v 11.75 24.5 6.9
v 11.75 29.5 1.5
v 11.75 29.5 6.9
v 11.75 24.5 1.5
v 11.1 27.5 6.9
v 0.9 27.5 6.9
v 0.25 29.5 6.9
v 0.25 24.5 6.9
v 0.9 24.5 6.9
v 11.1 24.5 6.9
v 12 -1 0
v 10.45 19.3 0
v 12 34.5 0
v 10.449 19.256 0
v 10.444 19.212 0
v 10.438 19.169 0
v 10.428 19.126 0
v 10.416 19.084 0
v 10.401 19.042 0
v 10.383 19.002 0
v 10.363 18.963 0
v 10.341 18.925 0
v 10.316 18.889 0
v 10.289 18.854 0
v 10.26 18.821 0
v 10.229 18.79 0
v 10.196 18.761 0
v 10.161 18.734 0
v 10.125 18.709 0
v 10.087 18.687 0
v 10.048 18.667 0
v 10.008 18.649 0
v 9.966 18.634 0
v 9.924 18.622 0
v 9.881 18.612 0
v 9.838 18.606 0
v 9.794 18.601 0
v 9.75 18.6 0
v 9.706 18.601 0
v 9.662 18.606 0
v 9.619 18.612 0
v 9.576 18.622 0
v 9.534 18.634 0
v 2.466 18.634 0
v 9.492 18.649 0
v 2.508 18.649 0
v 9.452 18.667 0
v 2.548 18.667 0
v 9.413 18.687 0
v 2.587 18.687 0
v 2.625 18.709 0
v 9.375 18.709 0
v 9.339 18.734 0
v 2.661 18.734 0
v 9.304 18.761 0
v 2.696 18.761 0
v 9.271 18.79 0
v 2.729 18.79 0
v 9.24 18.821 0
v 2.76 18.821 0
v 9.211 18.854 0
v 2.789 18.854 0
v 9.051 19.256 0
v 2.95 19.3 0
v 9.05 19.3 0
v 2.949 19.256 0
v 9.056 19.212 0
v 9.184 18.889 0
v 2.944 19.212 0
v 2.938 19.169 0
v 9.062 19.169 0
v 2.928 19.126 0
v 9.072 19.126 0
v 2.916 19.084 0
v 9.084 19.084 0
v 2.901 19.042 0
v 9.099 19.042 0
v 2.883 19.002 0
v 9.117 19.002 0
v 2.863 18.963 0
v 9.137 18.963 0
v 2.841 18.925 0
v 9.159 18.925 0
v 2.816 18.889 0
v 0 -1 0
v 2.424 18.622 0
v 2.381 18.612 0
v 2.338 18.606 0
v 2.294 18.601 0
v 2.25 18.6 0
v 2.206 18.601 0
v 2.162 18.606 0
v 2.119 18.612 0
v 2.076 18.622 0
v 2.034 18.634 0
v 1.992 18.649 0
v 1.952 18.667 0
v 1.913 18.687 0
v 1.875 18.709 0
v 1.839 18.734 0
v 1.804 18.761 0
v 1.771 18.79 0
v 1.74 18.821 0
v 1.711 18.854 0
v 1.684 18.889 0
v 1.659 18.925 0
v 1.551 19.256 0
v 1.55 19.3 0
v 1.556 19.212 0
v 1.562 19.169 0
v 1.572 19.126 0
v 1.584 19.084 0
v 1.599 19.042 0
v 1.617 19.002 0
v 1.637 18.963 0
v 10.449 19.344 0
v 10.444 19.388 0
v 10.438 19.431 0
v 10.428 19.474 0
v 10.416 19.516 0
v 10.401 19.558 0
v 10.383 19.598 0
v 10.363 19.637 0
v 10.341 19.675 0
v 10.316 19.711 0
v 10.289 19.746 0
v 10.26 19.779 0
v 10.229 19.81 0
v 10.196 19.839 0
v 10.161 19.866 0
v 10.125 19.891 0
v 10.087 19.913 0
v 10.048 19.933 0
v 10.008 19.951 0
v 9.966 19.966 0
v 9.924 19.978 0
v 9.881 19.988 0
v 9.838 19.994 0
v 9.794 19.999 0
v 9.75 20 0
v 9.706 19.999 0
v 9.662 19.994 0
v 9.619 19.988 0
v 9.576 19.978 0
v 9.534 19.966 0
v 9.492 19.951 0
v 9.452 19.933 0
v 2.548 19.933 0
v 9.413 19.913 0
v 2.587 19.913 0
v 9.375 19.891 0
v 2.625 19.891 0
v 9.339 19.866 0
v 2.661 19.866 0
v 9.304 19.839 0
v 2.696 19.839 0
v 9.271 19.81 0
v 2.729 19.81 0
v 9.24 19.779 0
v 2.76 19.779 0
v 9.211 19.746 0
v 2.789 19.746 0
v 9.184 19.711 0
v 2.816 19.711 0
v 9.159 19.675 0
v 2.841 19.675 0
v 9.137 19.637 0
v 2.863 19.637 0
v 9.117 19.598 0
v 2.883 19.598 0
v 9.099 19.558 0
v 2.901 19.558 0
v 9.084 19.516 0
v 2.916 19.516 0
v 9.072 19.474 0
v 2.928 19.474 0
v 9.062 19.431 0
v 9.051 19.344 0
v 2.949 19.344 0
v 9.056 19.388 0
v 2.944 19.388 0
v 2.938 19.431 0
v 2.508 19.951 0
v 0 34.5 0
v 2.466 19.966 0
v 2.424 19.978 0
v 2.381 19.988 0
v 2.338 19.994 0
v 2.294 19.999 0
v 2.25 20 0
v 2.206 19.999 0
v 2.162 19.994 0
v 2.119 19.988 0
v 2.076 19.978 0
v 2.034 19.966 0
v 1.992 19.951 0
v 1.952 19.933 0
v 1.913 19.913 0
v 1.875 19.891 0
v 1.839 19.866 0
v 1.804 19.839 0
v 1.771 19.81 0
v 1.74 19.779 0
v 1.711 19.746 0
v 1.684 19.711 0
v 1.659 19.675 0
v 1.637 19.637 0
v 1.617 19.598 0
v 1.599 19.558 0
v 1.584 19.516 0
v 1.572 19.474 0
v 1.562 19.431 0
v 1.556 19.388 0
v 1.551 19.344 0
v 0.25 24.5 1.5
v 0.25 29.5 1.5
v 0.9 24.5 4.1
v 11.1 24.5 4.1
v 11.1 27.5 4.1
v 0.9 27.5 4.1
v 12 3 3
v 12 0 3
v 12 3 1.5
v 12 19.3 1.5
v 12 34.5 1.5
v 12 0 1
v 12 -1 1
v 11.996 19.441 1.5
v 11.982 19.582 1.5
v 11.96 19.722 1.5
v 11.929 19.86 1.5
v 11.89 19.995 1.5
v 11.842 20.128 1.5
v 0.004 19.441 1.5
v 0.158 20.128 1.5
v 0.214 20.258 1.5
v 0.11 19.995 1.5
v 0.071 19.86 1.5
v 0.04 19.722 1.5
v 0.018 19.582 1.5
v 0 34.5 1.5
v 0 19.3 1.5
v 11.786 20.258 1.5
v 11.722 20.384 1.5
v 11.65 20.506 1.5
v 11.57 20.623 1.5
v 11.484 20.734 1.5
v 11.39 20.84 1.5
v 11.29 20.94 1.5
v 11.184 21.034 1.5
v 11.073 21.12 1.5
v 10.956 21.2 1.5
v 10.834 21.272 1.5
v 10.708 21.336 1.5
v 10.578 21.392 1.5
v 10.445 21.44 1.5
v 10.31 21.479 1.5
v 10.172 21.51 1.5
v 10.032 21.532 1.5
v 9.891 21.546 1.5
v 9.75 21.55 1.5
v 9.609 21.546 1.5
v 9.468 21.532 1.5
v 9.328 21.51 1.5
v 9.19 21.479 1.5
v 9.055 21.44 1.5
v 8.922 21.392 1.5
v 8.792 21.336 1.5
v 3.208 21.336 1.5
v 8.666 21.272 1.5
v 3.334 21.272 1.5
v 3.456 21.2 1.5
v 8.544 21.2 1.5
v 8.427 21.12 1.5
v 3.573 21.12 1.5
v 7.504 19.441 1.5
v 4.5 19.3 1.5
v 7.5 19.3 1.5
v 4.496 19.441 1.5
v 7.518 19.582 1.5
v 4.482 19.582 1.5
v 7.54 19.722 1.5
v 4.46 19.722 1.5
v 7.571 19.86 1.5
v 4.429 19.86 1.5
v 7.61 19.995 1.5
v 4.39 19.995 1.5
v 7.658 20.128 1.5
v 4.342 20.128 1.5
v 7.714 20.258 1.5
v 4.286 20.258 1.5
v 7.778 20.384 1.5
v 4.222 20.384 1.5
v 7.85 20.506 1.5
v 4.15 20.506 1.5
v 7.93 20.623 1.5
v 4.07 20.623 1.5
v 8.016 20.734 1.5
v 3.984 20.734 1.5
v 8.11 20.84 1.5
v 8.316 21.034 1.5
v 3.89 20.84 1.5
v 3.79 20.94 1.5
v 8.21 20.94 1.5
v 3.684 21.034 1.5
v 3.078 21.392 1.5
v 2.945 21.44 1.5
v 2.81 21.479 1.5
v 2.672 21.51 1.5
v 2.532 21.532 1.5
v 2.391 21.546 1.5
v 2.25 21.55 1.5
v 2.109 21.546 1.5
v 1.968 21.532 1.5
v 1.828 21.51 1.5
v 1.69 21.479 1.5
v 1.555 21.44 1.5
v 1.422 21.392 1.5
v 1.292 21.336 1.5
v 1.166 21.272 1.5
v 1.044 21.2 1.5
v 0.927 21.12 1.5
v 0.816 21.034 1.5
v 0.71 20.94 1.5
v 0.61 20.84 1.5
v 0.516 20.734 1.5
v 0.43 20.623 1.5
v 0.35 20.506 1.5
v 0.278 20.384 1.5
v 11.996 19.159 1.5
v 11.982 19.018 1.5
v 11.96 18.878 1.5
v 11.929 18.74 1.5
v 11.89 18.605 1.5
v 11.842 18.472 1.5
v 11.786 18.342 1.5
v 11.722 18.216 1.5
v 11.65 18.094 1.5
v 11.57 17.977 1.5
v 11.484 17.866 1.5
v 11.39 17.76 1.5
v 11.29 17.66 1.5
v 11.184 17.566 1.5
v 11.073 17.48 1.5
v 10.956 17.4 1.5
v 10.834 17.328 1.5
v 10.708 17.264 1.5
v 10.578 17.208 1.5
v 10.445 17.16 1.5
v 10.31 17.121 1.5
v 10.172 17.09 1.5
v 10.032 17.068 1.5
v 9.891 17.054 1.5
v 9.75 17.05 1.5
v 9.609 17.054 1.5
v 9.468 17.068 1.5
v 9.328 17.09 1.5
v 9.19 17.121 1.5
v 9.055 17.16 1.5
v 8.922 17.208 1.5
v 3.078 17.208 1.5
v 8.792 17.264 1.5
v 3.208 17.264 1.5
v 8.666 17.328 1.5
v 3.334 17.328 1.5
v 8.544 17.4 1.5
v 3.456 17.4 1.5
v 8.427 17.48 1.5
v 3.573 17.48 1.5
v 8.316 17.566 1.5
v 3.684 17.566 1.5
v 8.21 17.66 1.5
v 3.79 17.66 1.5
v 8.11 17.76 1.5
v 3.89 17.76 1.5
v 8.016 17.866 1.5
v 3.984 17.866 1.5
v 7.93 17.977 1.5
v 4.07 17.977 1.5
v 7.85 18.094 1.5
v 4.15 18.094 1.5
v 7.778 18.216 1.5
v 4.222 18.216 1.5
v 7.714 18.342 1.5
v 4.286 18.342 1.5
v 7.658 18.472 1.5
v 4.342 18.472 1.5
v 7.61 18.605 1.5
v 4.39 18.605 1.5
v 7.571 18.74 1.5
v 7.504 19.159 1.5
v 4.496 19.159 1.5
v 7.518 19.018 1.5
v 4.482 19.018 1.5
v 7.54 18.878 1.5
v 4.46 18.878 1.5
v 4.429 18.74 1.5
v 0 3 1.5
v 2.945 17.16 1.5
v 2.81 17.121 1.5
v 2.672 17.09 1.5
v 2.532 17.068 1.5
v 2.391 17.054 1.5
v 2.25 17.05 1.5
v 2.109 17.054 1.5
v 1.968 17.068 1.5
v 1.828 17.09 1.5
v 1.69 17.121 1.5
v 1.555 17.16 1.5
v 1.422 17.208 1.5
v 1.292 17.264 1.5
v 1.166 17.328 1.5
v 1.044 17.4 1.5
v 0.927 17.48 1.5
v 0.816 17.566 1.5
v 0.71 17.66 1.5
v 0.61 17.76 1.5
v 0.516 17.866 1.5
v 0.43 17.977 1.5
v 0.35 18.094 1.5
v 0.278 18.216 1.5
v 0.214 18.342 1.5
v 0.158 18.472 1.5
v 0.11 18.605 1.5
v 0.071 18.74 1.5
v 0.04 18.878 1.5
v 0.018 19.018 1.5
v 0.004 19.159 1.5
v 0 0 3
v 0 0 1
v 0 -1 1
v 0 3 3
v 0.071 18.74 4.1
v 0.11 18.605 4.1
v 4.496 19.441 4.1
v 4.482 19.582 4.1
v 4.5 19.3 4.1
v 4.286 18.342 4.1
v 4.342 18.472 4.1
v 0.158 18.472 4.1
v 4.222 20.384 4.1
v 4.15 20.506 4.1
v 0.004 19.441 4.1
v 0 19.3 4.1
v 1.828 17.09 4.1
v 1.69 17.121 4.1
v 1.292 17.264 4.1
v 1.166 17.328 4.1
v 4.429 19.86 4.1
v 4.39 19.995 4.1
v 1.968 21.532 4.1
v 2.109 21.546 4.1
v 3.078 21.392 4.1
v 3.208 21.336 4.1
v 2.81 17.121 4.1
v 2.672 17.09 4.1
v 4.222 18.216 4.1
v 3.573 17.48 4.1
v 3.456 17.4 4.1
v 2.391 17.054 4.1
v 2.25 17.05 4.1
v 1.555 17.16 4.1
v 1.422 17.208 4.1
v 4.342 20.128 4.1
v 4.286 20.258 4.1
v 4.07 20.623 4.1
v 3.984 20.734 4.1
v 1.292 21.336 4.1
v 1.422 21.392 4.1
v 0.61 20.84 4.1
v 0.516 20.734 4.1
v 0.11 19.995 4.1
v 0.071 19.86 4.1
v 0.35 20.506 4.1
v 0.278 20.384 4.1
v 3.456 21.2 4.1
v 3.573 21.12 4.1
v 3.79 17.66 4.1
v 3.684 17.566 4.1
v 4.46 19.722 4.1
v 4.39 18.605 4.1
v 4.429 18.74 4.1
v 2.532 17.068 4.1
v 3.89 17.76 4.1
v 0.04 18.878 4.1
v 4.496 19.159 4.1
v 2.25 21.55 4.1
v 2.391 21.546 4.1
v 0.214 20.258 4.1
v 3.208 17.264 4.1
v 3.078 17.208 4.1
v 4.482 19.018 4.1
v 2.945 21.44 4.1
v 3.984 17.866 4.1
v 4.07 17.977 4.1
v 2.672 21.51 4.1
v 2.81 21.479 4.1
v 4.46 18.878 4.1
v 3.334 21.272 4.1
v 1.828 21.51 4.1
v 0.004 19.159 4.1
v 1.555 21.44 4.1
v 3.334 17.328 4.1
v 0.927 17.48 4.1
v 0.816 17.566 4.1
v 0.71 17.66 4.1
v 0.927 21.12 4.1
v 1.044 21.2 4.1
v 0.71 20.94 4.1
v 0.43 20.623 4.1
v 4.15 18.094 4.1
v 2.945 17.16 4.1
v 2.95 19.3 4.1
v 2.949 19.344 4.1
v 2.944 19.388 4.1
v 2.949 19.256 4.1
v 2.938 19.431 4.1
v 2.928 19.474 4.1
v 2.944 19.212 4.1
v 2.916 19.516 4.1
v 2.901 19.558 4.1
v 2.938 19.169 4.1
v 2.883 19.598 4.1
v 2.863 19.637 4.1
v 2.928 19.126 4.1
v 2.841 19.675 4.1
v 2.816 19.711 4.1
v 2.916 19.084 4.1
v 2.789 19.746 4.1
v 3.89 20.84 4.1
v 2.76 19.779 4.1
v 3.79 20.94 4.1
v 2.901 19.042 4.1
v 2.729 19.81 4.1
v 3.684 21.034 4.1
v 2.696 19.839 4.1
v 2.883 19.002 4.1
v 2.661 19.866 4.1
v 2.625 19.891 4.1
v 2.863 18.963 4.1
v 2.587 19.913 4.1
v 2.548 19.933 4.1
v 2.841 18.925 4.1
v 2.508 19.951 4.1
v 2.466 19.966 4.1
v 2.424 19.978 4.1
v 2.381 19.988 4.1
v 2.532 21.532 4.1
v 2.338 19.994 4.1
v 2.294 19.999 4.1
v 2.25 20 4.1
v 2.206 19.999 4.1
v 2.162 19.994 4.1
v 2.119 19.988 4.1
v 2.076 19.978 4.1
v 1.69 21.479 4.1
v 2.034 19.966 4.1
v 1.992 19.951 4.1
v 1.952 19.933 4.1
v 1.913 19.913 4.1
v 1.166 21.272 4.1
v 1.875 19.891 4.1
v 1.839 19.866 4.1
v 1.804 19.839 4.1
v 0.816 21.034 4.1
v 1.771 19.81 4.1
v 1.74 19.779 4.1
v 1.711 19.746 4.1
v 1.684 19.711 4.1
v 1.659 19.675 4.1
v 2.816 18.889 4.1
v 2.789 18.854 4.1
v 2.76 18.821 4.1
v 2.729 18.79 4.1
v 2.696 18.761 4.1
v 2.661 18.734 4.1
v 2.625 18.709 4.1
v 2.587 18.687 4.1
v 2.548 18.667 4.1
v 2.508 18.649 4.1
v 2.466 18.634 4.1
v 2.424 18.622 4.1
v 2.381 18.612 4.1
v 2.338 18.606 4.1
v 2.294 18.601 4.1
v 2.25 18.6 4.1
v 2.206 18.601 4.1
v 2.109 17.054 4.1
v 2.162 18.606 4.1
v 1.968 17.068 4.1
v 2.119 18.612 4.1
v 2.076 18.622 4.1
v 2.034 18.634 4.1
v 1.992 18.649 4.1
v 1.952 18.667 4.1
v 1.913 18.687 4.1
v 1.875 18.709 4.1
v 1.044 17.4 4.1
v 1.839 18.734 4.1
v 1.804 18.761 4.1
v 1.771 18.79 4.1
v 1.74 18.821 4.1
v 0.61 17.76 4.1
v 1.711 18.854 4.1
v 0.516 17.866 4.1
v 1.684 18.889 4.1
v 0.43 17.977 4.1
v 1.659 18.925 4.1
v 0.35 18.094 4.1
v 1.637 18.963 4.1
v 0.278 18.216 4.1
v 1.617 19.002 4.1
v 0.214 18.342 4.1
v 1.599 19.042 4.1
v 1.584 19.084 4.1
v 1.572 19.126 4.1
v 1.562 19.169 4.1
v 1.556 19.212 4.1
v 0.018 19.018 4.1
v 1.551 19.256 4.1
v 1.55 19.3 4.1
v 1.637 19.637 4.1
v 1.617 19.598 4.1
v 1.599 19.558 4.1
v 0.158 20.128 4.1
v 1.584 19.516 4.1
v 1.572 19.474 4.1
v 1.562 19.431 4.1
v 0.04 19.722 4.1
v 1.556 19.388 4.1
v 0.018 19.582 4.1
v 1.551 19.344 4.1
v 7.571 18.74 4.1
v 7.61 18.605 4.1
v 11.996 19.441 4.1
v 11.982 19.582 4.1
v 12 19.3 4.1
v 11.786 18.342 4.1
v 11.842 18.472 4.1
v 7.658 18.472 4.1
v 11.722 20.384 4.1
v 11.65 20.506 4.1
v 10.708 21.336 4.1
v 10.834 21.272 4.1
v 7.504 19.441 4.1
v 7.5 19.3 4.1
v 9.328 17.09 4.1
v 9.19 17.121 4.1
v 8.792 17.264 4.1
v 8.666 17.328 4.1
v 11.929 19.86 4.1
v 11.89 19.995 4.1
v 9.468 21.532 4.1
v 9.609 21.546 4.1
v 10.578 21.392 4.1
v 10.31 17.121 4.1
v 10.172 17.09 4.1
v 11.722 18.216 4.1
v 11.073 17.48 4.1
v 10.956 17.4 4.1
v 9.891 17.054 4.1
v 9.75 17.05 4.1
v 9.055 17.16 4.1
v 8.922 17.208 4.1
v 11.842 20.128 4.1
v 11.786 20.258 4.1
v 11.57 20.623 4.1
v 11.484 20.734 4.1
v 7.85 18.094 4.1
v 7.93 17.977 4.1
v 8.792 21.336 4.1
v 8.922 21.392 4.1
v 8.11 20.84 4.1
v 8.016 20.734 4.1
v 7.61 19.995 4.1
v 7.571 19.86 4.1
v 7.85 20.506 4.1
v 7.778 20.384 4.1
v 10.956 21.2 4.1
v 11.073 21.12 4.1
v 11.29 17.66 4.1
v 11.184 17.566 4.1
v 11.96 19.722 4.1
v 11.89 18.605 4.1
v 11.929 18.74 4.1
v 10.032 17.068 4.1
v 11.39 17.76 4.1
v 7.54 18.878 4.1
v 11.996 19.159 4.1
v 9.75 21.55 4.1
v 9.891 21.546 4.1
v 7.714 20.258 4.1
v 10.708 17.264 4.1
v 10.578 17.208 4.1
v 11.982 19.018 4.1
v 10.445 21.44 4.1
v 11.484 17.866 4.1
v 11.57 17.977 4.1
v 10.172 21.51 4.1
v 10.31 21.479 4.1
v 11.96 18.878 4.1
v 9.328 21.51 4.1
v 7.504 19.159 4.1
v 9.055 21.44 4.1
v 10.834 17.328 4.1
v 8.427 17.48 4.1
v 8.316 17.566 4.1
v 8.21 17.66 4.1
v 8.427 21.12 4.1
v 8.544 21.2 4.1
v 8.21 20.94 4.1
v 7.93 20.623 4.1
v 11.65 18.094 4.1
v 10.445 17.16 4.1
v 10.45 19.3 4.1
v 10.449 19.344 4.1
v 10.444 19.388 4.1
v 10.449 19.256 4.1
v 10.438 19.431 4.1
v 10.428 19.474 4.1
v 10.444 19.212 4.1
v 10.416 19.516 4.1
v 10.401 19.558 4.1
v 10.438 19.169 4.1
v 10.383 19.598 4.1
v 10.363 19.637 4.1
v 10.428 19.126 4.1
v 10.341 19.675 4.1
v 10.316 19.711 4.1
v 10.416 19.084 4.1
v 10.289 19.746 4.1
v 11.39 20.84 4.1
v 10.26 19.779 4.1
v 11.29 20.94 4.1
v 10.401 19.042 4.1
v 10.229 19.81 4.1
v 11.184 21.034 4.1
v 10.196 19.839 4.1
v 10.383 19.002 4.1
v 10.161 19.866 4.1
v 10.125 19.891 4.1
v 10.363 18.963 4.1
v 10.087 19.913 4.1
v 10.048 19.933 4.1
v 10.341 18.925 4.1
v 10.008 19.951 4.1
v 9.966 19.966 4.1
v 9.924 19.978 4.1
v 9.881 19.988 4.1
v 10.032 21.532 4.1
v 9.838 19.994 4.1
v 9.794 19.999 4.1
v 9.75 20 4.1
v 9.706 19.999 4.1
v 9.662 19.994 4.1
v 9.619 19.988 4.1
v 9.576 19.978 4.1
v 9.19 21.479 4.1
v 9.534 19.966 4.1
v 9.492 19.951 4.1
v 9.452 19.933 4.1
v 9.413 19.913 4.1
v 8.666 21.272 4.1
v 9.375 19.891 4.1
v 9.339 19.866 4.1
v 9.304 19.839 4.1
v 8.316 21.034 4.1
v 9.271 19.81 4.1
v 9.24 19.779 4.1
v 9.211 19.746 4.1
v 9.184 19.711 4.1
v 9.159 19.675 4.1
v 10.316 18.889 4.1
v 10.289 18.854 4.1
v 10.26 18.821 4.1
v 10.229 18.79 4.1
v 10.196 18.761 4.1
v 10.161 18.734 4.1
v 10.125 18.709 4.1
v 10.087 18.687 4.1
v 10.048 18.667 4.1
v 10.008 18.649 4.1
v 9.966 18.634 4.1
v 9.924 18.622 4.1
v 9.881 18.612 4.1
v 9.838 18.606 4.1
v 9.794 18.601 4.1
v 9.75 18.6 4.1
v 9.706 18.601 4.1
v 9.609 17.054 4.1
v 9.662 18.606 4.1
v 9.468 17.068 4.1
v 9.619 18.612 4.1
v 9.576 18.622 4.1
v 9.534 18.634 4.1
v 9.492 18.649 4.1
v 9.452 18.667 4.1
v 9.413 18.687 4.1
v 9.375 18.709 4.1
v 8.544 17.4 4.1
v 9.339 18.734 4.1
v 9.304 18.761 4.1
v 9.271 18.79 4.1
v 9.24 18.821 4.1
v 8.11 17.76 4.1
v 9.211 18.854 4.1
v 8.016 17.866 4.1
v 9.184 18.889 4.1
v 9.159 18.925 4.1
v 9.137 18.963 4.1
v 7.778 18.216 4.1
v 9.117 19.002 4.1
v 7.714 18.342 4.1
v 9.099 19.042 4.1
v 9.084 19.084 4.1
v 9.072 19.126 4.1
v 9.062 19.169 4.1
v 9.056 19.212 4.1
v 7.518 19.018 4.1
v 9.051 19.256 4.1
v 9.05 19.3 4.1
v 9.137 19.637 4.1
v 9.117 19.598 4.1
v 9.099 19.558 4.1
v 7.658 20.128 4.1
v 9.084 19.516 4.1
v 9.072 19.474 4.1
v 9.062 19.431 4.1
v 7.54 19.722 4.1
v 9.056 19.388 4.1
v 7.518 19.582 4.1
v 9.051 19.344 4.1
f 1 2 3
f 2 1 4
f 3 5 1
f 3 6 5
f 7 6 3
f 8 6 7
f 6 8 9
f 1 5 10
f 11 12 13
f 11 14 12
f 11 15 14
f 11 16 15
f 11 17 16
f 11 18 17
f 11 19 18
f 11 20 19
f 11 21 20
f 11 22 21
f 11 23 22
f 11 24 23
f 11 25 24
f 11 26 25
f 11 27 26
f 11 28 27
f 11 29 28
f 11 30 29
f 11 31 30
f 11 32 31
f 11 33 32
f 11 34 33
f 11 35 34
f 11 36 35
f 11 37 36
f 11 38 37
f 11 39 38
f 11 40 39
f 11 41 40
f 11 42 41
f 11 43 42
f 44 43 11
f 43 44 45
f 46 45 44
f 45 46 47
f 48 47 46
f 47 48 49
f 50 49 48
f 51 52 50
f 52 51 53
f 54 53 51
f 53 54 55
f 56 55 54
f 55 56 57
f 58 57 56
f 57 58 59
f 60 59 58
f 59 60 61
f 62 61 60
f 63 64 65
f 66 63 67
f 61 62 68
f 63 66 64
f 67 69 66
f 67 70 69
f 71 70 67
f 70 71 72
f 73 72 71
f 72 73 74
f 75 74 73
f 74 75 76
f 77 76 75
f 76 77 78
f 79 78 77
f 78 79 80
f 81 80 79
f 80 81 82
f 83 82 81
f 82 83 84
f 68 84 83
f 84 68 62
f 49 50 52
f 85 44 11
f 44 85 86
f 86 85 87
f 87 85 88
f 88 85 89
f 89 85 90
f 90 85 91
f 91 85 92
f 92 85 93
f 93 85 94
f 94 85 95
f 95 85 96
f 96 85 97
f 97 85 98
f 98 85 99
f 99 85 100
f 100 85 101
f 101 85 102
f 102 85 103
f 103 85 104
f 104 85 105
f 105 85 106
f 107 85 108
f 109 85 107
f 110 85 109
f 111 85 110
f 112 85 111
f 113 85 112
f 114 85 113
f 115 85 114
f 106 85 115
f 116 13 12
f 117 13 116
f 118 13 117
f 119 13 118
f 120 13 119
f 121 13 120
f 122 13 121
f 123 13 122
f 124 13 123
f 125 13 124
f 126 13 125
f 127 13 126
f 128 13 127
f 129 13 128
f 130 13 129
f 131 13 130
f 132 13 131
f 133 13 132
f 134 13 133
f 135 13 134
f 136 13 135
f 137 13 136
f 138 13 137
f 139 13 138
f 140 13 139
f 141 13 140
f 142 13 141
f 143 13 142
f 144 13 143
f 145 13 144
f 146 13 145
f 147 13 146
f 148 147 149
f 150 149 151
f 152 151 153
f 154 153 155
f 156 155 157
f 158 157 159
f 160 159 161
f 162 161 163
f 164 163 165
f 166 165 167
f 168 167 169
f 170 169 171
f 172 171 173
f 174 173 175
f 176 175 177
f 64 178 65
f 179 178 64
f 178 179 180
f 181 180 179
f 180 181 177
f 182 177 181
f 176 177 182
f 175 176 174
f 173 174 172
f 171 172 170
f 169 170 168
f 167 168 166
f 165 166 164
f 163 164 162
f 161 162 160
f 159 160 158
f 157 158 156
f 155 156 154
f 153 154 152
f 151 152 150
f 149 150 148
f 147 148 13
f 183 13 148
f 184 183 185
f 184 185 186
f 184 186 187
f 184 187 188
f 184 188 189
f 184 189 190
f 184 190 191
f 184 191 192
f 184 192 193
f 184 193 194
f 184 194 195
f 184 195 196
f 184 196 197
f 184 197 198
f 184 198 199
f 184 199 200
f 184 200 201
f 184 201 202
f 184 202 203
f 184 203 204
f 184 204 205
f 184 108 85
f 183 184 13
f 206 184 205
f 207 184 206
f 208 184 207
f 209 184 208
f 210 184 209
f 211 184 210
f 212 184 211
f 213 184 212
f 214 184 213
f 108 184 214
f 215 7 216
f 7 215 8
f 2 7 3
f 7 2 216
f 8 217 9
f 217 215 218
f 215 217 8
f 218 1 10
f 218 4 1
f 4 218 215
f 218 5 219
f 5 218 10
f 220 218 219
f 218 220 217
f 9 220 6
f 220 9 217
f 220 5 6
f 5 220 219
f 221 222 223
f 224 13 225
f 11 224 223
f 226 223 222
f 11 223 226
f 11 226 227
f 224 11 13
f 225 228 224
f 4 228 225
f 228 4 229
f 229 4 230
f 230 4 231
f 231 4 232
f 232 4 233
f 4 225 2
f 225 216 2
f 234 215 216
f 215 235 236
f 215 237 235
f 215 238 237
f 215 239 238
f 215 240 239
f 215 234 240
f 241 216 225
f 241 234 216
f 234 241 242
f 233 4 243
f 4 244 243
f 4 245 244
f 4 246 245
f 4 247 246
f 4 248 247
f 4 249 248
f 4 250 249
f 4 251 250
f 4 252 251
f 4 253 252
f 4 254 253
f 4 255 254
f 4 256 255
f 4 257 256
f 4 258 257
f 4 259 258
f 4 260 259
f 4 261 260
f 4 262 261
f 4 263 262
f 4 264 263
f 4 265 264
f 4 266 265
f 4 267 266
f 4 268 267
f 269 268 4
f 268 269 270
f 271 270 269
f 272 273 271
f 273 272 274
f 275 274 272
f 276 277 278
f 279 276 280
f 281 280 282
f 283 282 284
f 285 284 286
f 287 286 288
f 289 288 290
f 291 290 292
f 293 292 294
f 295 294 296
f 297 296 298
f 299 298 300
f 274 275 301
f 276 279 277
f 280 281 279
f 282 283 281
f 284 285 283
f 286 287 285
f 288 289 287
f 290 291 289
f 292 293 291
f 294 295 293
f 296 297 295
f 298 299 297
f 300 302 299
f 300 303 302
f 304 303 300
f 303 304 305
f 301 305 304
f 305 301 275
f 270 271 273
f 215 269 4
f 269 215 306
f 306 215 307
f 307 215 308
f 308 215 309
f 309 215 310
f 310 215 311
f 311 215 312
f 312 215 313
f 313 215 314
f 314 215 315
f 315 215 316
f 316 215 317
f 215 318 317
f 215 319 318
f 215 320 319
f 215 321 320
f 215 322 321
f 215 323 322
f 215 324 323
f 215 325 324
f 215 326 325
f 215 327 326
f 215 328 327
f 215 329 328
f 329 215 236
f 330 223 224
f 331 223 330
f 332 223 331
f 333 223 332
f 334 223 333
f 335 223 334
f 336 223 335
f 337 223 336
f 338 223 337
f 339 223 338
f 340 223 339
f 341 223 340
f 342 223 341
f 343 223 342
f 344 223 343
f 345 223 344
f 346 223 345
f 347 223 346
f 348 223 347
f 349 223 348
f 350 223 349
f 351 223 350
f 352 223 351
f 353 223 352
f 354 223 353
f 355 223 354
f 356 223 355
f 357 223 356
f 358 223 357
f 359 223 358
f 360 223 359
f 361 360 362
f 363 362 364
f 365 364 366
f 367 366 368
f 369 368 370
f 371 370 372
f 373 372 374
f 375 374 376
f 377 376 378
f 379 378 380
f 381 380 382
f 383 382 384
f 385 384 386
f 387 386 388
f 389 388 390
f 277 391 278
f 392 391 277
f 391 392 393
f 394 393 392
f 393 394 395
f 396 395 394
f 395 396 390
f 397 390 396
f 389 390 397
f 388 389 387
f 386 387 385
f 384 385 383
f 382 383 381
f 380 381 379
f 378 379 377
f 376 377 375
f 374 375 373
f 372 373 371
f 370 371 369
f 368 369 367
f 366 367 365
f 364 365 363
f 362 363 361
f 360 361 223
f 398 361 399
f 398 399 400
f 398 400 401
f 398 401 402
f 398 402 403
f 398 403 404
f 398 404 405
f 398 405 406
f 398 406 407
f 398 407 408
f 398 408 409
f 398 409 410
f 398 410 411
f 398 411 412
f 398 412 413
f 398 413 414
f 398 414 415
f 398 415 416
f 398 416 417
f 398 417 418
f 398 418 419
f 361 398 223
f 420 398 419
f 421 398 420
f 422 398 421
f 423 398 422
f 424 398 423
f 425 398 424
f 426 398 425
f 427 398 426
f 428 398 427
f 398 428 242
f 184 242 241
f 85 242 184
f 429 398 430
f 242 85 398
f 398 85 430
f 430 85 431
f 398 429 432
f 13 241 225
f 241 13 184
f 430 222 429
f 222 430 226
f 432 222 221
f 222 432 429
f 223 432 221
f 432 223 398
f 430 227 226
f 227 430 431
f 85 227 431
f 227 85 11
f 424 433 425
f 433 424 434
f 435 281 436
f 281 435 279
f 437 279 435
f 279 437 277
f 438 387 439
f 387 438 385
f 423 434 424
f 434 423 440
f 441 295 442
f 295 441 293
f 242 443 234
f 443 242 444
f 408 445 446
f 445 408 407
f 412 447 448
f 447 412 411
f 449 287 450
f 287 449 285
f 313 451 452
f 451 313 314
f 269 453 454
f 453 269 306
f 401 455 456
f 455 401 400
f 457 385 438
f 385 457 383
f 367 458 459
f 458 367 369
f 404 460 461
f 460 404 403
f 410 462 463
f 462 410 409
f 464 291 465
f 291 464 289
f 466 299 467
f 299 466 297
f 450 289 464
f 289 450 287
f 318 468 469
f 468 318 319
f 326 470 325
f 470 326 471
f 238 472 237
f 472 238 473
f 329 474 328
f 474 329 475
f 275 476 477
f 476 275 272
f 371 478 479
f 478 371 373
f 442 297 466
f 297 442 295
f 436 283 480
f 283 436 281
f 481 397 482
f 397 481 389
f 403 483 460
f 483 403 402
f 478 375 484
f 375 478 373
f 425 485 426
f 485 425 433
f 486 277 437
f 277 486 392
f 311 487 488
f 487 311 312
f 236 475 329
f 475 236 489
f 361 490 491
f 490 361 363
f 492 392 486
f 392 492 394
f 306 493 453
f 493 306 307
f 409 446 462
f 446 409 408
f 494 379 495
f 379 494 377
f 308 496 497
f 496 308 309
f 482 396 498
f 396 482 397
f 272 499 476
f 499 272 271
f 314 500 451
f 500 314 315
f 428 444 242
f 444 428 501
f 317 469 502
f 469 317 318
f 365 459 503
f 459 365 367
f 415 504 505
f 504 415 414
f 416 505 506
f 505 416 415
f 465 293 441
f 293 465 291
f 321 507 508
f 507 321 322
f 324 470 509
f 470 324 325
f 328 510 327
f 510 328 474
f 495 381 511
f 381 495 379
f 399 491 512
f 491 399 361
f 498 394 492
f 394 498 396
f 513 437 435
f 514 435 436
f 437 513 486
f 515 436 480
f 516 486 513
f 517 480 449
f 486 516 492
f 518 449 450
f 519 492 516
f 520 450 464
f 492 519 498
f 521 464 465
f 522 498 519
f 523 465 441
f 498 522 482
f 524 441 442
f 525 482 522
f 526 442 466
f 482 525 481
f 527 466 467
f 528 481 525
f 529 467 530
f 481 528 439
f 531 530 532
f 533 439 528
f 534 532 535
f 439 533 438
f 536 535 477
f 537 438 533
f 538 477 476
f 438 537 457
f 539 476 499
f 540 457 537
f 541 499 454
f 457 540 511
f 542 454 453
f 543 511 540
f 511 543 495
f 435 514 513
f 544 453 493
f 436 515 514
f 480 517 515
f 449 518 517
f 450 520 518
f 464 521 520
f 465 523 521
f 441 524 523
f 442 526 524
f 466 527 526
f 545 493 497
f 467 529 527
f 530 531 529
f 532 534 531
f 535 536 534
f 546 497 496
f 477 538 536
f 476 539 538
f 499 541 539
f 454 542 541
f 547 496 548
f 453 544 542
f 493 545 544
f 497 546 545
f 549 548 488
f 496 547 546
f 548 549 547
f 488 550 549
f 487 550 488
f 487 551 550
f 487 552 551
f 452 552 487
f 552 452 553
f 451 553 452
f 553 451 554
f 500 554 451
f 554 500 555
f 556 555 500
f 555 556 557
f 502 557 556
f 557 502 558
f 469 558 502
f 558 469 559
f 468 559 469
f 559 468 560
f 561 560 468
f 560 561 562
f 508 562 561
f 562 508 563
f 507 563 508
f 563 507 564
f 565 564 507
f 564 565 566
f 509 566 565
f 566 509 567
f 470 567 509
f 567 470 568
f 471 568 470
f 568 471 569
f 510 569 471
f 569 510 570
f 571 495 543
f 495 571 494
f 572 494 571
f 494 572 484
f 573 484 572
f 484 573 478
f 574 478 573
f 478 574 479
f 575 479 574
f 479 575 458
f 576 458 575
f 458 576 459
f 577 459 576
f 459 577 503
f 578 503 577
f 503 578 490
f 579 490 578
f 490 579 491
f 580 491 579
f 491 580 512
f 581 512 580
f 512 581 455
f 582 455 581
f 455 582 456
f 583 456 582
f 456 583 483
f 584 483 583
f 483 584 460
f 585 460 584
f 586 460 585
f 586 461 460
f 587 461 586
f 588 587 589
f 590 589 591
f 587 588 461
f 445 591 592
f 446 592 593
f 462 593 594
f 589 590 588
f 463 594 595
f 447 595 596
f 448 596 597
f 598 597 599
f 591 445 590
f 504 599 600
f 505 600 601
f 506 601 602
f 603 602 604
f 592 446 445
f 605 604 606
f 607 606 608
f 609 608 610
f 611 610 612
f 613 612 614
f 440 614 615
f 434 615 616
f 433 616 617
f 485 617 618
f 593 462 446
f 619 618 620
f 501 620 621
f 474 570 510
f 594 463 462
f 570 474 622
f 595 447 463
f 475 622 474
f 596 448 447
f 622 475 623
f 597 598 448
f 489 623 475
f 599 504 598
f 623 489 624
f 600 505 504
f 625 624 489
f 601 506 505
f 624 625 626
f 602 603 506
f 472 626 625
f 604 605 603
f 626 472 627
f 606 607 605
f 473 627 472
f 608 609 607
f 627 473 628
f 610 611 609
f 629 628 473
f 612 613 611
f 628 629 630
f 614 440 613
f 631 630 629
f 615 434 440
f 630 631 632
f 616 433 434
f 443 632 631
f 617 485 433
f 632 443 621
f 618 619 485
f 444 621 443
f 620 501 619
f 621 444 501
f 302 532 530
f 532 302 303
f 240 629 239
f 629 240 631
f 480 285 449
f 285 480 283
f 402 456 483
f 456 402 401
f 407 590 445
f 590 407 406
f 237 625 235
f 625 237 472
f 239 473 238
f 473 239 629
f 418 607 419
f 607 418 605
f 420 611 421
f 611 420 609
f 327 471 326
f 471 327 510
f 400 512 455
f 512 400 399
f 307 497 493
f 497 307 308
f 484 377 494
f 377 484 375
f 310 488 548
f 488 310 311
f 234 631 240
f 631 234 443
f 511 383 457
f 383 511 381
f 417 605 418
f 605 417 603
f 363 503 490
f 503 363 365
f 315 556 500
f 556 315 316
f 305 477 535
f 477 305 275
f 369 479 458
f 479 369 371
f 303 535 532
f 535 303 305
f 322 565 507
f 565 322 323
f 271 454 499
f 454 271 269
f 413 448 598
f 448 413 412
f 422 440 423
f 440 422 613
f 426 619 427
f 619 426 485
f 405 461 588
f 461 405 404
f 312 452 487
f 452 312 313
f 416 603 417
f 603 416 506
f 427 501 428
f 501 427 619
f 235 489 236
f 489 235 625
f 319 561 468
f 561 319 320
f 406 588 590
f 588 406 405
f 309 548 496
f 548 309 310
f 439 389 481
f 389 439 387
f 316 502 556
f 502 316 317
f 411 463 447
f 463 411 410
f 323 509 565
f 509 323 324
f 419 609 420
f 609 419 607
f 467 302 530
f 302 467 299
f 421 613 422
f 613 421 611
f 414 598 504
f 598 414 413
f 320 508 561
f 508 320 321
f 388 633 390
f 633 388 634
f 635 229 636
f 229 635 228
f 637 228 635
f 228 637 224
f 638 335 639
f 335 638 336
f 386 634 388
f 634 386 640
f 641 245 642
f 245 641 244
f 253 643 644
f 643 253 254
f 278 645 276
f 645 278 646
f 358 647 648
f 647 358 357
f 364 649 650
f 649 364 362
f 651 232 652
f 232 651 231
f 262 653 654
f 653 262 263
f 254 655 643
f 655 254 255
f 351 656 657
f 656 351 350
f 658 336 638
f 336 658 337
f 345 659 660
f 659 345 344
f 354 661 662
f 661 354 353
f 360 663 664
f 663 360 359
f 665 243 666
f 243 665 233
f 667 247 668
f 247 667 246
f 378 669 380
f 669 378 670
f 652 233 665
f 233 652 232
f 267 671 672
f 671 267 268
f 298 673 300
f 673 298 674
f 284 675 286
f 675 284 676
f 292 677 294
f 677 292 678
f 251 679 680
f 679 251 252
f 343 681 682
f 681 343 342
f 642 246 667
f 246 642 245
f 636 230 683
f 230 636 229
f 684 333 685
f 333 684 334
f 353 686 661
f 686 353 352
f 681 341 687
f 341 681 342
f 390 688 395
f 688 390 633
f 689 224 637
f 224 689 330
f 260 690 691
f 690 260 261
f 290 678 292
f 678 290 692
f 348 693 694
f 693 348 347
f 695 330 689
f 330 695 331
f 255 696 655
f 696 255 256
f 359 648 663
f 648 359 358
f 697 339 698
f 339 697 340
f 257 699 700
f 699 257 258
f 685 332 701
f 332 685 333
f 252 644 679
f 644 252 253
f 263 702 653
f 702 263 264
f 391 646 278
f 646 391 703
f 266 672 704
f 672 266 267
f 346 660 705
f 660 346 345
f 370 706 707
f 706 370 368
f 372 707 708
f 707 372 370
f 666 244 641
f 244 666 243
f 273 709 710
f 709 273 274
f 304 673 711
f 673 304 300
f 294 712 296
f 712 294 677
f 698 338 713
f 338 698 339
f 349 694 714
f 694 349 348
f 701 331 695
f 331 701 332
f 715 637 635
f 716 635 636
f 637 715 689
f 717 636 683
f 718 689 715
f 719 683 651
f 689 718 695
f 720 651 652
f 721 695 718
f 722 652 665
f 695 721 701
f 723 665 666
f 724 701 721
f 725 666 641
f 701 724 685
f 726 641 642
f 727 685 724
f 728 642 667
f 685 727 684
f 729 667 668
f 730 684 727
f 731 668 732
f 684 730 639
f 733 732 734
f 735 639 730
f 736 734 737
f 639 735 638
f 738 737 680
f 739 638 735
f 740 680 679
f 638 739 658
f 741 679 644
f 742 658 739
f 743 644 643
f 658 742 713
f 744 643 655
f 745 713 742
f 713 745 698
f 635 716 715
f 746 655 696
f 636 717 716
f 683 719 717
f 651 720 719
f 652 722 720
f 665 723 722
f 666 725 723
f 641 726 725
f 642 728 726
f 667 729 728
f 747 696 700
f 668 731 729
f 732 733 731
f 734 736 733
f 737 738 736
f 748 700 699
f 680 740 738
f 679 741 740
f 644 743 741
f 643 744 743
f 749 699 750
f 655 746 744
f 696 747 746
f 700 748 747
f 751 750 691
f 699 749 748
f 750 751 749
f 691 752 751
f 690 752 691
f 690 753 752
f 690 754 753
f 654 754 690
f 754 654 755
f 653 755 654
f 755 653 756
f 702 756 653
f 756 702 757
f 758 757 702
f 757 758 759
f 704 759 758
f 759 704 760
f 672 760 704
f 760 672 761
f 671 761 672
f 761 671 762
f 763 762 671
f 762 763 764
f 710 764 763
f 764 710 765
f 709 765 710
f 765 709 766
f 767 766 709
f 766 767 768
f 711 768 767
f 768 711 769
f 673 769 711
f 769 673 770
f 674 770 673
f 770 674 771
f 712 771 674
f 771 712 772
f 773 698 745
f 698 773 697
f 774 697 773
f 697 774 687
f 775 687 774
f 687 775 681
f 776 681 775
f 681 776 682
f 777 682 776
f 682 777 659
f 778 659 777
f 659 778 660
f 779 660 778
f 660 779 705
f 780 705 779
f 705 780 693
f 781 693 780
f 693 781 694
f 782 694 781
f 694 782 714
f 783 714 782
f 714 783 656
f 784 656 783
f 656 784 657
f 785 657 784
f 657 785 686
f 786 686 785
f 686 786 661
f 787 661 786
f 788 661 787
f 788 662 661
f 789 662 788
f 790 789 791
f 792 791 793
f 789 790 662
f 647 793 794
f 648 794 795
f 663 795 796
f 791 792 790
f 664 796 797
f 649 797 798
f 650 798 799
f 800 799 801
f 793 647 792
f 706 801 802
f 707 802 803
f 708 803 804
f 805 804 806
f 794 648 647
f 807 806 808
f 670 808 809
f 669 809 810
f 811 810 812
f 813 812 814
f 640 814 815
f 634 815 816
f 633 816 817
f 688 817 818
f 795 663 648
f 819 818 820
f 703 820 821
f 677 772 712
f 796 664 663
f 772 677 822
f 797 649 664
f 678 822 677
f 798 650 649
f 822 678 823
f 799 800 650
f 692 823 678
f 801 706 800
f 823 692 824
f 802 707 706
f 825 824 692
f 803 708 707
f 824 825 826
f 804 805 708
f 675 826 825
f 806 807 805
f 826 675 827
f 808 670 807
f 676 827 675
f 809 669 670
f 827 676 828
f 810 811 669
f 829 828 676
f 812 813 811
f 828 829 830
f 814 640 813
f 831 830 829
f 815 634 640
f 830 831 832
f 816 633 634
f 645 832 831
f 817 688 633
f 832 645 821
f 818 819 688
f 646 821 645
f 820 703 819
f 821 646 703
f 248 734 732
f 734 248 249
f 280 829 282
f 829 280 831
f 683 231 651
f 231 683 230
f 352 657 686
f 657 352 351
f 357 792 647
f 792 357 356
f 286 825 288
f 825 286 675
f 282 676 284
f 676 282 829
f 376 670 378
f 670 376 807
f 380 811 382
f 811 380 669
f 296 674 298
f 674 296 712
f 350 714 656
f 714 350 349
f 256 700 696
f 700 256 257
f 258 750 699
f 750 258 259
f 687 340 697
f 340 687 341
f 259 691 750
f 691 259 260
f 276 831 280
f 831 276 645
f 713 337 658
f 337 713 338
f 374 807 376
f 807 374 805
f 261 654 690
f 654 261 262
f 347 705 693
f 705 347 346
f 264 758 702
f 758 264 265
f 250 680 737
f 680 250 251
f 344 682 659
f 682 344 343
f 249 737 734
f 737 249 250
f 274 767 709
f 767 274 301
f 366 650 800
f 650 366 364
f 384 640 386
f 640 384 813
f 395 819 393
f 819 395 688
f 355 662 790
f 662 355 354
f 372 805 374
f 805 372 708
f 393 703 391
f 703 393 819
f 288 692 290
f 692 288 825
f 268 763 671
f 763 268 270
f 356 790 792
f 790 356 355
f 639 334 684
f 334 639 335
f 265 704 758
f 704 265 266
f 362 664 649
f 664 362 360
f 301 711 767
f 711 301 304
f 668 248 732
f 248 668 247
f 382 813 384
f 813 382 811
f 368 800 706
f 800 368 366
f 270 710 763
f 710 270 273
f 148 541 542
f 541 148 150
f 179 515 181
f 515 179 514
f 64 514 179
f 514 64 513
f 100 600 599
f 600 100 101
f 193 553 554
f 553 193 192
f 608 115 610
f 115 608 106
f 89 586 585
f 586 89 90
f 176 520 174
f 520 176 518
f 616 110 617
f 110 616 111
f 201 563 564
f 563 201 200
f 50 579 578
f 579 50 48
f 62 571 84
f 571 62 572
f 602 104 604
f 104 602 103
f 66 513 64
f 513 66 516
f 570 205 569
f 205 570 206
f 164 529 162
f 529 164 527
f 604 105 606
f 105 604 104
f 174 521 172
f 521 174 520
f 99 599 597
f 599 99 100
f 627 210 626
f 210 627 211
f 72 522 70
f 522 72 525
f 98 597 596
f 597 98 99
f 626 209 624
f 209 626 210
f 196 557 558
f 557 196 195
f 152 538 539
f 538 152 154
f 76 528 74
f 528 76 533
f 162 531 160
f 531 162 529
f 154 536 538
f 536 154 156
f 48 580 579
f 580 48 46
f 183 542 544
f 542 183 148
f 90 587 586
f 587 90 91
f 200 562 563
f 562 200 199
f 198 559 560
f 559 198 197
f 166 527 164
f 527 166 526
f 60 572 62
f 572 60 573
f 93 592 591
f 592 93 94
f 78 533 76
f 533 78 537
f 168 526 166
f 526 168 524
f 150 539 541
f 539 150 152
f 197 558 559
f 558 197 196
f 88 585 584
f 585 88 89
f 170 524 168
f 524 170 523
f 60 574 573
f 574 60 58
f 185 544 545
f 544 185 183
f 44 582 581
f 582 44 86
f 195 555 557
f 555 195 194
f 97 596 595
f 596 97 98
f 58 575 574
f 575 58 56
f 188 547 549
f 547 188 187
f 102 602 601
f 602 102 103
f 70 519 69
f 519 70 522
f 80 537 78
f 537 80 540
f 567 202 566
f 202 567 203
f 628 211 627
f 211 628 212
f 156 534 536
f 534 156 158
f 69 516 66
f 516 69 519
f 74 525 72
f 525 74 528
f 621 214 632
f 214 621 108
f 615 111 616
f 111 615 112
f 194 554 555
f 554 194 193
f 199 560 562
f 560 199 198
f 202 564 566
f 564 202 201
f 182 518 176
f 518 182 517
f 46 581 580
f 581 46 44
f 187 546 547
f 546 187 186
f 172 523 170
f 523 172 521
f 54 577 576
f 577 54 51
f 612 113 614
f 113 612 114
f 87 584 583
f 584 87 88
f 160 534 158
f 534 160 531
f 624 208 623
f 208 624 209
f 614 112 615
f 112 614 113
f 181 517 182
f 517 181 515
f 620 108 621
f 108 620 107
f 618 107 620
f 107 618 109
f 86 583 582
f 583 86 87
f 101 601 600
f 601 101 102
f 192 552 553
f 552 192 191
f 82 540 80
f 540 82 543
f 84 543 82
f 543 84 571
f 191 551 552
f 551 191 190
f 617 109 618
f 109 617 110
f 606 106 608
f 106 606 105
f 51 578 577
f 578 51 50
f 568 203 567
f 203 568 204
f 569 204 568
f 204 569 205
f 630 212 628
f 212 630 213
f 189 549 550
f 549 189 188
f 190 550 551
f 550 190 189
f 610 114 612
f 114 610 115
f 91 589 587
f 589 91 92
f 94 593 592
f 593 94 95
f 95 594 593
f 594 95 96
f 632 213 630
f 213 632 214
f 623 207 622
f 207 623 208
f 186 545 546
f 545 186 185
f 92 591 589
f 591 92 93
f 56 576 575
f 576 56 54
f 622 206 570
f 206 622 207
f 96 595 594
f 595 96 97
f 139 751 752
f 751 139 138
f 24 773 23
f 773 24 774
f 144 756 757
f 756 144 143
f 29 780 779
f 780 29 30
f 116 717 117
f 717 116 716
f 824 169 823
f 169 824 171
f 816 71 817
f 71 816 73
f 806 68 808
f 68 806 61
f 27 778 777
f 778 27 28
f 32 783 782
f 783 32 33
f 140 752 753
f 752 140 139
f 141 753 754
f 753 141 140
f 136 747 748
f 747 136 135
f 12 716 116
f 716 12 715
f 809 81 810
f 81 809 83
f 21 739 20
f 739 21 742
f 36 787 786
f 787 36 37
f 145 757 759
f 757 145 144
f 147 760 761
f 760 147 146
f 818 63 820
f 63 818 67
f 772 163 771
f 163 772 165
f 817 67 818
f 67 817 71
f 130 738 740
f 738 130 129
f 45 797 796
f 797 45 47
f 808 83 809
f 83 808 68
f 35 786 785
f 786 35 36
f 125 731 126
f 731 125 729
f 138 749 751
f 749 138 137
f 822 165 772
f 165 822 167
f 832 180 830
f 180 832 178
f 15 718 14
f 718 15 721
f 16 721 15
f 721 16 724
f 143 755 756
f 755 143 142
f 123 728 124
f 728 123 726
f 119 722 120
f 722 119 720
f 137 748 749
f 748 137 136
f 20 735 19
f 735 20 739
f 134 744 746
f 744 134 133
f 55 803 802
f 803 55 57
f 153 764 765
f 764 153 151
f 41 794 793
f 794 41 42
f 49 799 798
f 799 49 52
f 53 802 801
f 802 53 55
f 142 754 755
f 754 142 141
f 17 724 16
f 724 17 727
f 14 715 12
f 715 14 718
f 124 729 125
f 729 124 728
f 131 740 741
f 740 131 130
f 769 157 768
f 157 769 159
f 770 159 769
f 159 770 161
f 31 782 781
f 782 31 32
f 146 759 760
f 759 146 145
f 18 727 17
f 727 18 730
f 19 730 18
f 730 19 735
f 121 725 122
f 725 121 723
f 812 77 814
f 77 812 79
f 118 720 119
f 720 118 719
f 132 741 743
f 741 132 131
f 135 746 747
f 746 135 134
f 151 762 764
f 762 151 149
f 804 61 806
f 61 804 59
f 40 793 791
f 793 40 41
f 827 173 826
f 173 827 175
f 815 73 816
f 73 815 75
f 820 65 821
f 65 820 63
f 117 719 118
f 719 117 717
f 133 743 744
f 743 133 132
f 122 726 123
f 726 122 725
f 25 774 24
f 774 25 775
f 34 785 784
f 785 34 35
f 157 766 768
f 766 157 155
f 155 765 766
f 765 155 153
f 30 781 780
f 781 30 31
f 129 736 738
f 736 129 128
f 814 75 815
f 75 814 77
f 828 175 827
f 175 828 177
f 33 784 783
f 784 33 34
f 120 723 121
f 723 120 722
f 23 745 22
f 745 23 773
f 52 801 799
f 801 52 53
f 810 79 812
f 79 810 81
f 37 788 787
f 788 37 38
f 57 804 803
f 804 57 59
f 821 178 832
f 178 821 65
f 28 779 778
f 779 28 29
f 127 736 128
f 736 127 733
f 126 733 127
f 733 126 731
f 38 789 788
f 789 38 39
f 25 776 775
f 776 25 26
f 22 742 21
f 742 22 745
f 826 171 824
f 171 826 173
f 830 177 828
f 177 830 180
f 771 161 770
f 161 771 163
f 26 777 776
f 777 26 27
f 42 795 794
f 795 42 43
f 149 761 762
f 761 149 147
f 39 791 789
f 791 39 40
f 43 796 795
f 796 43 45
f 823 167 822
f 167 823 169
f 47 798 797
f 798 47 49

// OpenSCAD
$fn = 100;

length_total = 34.5; // +1.0mm below the PCB
width_total = 12;
height_total = 6.9;

pcb_top = 5.7;
pcb_bottom = pcb_top - 1.6;
pcb_width = 10.2;
pcb_length = 7.2;

led_center_offset = 26;
led_to_pcb_edge = 1.5;

screw_hole_dia = 1.4;
screw_post_dia = 4.5;

module mounting_screw_hole() {
    translate([0, 0, -1])
        cylinder(d = screw_hole_dia, h = pcb_bottom + 2);
}

module mounting_screw() {
    difference() {
        cylinder(d = screw_post_dia, h = pcb_bottom);
        
        //mounting_screw_hole();
    }
}

difference(){
    union() {
        // Base
        cube([width_total, length_total, 1.5]);
        // Front ledge towards the PCB
        cube([width_total, 3.0, 3.0]);
        translate([0, -1, 0])
            cube([width_total, 2, 1]);
        
        // Back PCB holder
        difference() {
            translate([0.25, led_center_offset + led_to_pcb_edge - 3.0, 0])
                cube([width_total - 0.5, 5.0, height_total]);
            
            translate([(width_total - pcb_width) / 2, led_center_offset + led_to_pcb_edge  - 5.0, pcb_bottom])
                cube([pcb_width, 5.0, 100]);
        }
        
        translate([screw_post_dia / 2, led_center_offset + led_to_pcb_edge - pcb_length - 1.0, 0])
            mounting_screw();
        
        translate([width_total - screw_post_dia / 2, led_center_offset + led_to_pcb_edge - pcb_length - 1.0, 0])
            mounting_screw();
    }
    
    translate([screw_post_dia / 2, led_center_offset + led_to_pcb_edge - pcb_length - 1.0, 0])
        mounting_screw_hole();
    
    translate([width_total - screw_post_dia / 2, led_center_offset + led_to_pcb_edge - pcb_length - 1.0, 0])
        mounting_screw_hole();
}
